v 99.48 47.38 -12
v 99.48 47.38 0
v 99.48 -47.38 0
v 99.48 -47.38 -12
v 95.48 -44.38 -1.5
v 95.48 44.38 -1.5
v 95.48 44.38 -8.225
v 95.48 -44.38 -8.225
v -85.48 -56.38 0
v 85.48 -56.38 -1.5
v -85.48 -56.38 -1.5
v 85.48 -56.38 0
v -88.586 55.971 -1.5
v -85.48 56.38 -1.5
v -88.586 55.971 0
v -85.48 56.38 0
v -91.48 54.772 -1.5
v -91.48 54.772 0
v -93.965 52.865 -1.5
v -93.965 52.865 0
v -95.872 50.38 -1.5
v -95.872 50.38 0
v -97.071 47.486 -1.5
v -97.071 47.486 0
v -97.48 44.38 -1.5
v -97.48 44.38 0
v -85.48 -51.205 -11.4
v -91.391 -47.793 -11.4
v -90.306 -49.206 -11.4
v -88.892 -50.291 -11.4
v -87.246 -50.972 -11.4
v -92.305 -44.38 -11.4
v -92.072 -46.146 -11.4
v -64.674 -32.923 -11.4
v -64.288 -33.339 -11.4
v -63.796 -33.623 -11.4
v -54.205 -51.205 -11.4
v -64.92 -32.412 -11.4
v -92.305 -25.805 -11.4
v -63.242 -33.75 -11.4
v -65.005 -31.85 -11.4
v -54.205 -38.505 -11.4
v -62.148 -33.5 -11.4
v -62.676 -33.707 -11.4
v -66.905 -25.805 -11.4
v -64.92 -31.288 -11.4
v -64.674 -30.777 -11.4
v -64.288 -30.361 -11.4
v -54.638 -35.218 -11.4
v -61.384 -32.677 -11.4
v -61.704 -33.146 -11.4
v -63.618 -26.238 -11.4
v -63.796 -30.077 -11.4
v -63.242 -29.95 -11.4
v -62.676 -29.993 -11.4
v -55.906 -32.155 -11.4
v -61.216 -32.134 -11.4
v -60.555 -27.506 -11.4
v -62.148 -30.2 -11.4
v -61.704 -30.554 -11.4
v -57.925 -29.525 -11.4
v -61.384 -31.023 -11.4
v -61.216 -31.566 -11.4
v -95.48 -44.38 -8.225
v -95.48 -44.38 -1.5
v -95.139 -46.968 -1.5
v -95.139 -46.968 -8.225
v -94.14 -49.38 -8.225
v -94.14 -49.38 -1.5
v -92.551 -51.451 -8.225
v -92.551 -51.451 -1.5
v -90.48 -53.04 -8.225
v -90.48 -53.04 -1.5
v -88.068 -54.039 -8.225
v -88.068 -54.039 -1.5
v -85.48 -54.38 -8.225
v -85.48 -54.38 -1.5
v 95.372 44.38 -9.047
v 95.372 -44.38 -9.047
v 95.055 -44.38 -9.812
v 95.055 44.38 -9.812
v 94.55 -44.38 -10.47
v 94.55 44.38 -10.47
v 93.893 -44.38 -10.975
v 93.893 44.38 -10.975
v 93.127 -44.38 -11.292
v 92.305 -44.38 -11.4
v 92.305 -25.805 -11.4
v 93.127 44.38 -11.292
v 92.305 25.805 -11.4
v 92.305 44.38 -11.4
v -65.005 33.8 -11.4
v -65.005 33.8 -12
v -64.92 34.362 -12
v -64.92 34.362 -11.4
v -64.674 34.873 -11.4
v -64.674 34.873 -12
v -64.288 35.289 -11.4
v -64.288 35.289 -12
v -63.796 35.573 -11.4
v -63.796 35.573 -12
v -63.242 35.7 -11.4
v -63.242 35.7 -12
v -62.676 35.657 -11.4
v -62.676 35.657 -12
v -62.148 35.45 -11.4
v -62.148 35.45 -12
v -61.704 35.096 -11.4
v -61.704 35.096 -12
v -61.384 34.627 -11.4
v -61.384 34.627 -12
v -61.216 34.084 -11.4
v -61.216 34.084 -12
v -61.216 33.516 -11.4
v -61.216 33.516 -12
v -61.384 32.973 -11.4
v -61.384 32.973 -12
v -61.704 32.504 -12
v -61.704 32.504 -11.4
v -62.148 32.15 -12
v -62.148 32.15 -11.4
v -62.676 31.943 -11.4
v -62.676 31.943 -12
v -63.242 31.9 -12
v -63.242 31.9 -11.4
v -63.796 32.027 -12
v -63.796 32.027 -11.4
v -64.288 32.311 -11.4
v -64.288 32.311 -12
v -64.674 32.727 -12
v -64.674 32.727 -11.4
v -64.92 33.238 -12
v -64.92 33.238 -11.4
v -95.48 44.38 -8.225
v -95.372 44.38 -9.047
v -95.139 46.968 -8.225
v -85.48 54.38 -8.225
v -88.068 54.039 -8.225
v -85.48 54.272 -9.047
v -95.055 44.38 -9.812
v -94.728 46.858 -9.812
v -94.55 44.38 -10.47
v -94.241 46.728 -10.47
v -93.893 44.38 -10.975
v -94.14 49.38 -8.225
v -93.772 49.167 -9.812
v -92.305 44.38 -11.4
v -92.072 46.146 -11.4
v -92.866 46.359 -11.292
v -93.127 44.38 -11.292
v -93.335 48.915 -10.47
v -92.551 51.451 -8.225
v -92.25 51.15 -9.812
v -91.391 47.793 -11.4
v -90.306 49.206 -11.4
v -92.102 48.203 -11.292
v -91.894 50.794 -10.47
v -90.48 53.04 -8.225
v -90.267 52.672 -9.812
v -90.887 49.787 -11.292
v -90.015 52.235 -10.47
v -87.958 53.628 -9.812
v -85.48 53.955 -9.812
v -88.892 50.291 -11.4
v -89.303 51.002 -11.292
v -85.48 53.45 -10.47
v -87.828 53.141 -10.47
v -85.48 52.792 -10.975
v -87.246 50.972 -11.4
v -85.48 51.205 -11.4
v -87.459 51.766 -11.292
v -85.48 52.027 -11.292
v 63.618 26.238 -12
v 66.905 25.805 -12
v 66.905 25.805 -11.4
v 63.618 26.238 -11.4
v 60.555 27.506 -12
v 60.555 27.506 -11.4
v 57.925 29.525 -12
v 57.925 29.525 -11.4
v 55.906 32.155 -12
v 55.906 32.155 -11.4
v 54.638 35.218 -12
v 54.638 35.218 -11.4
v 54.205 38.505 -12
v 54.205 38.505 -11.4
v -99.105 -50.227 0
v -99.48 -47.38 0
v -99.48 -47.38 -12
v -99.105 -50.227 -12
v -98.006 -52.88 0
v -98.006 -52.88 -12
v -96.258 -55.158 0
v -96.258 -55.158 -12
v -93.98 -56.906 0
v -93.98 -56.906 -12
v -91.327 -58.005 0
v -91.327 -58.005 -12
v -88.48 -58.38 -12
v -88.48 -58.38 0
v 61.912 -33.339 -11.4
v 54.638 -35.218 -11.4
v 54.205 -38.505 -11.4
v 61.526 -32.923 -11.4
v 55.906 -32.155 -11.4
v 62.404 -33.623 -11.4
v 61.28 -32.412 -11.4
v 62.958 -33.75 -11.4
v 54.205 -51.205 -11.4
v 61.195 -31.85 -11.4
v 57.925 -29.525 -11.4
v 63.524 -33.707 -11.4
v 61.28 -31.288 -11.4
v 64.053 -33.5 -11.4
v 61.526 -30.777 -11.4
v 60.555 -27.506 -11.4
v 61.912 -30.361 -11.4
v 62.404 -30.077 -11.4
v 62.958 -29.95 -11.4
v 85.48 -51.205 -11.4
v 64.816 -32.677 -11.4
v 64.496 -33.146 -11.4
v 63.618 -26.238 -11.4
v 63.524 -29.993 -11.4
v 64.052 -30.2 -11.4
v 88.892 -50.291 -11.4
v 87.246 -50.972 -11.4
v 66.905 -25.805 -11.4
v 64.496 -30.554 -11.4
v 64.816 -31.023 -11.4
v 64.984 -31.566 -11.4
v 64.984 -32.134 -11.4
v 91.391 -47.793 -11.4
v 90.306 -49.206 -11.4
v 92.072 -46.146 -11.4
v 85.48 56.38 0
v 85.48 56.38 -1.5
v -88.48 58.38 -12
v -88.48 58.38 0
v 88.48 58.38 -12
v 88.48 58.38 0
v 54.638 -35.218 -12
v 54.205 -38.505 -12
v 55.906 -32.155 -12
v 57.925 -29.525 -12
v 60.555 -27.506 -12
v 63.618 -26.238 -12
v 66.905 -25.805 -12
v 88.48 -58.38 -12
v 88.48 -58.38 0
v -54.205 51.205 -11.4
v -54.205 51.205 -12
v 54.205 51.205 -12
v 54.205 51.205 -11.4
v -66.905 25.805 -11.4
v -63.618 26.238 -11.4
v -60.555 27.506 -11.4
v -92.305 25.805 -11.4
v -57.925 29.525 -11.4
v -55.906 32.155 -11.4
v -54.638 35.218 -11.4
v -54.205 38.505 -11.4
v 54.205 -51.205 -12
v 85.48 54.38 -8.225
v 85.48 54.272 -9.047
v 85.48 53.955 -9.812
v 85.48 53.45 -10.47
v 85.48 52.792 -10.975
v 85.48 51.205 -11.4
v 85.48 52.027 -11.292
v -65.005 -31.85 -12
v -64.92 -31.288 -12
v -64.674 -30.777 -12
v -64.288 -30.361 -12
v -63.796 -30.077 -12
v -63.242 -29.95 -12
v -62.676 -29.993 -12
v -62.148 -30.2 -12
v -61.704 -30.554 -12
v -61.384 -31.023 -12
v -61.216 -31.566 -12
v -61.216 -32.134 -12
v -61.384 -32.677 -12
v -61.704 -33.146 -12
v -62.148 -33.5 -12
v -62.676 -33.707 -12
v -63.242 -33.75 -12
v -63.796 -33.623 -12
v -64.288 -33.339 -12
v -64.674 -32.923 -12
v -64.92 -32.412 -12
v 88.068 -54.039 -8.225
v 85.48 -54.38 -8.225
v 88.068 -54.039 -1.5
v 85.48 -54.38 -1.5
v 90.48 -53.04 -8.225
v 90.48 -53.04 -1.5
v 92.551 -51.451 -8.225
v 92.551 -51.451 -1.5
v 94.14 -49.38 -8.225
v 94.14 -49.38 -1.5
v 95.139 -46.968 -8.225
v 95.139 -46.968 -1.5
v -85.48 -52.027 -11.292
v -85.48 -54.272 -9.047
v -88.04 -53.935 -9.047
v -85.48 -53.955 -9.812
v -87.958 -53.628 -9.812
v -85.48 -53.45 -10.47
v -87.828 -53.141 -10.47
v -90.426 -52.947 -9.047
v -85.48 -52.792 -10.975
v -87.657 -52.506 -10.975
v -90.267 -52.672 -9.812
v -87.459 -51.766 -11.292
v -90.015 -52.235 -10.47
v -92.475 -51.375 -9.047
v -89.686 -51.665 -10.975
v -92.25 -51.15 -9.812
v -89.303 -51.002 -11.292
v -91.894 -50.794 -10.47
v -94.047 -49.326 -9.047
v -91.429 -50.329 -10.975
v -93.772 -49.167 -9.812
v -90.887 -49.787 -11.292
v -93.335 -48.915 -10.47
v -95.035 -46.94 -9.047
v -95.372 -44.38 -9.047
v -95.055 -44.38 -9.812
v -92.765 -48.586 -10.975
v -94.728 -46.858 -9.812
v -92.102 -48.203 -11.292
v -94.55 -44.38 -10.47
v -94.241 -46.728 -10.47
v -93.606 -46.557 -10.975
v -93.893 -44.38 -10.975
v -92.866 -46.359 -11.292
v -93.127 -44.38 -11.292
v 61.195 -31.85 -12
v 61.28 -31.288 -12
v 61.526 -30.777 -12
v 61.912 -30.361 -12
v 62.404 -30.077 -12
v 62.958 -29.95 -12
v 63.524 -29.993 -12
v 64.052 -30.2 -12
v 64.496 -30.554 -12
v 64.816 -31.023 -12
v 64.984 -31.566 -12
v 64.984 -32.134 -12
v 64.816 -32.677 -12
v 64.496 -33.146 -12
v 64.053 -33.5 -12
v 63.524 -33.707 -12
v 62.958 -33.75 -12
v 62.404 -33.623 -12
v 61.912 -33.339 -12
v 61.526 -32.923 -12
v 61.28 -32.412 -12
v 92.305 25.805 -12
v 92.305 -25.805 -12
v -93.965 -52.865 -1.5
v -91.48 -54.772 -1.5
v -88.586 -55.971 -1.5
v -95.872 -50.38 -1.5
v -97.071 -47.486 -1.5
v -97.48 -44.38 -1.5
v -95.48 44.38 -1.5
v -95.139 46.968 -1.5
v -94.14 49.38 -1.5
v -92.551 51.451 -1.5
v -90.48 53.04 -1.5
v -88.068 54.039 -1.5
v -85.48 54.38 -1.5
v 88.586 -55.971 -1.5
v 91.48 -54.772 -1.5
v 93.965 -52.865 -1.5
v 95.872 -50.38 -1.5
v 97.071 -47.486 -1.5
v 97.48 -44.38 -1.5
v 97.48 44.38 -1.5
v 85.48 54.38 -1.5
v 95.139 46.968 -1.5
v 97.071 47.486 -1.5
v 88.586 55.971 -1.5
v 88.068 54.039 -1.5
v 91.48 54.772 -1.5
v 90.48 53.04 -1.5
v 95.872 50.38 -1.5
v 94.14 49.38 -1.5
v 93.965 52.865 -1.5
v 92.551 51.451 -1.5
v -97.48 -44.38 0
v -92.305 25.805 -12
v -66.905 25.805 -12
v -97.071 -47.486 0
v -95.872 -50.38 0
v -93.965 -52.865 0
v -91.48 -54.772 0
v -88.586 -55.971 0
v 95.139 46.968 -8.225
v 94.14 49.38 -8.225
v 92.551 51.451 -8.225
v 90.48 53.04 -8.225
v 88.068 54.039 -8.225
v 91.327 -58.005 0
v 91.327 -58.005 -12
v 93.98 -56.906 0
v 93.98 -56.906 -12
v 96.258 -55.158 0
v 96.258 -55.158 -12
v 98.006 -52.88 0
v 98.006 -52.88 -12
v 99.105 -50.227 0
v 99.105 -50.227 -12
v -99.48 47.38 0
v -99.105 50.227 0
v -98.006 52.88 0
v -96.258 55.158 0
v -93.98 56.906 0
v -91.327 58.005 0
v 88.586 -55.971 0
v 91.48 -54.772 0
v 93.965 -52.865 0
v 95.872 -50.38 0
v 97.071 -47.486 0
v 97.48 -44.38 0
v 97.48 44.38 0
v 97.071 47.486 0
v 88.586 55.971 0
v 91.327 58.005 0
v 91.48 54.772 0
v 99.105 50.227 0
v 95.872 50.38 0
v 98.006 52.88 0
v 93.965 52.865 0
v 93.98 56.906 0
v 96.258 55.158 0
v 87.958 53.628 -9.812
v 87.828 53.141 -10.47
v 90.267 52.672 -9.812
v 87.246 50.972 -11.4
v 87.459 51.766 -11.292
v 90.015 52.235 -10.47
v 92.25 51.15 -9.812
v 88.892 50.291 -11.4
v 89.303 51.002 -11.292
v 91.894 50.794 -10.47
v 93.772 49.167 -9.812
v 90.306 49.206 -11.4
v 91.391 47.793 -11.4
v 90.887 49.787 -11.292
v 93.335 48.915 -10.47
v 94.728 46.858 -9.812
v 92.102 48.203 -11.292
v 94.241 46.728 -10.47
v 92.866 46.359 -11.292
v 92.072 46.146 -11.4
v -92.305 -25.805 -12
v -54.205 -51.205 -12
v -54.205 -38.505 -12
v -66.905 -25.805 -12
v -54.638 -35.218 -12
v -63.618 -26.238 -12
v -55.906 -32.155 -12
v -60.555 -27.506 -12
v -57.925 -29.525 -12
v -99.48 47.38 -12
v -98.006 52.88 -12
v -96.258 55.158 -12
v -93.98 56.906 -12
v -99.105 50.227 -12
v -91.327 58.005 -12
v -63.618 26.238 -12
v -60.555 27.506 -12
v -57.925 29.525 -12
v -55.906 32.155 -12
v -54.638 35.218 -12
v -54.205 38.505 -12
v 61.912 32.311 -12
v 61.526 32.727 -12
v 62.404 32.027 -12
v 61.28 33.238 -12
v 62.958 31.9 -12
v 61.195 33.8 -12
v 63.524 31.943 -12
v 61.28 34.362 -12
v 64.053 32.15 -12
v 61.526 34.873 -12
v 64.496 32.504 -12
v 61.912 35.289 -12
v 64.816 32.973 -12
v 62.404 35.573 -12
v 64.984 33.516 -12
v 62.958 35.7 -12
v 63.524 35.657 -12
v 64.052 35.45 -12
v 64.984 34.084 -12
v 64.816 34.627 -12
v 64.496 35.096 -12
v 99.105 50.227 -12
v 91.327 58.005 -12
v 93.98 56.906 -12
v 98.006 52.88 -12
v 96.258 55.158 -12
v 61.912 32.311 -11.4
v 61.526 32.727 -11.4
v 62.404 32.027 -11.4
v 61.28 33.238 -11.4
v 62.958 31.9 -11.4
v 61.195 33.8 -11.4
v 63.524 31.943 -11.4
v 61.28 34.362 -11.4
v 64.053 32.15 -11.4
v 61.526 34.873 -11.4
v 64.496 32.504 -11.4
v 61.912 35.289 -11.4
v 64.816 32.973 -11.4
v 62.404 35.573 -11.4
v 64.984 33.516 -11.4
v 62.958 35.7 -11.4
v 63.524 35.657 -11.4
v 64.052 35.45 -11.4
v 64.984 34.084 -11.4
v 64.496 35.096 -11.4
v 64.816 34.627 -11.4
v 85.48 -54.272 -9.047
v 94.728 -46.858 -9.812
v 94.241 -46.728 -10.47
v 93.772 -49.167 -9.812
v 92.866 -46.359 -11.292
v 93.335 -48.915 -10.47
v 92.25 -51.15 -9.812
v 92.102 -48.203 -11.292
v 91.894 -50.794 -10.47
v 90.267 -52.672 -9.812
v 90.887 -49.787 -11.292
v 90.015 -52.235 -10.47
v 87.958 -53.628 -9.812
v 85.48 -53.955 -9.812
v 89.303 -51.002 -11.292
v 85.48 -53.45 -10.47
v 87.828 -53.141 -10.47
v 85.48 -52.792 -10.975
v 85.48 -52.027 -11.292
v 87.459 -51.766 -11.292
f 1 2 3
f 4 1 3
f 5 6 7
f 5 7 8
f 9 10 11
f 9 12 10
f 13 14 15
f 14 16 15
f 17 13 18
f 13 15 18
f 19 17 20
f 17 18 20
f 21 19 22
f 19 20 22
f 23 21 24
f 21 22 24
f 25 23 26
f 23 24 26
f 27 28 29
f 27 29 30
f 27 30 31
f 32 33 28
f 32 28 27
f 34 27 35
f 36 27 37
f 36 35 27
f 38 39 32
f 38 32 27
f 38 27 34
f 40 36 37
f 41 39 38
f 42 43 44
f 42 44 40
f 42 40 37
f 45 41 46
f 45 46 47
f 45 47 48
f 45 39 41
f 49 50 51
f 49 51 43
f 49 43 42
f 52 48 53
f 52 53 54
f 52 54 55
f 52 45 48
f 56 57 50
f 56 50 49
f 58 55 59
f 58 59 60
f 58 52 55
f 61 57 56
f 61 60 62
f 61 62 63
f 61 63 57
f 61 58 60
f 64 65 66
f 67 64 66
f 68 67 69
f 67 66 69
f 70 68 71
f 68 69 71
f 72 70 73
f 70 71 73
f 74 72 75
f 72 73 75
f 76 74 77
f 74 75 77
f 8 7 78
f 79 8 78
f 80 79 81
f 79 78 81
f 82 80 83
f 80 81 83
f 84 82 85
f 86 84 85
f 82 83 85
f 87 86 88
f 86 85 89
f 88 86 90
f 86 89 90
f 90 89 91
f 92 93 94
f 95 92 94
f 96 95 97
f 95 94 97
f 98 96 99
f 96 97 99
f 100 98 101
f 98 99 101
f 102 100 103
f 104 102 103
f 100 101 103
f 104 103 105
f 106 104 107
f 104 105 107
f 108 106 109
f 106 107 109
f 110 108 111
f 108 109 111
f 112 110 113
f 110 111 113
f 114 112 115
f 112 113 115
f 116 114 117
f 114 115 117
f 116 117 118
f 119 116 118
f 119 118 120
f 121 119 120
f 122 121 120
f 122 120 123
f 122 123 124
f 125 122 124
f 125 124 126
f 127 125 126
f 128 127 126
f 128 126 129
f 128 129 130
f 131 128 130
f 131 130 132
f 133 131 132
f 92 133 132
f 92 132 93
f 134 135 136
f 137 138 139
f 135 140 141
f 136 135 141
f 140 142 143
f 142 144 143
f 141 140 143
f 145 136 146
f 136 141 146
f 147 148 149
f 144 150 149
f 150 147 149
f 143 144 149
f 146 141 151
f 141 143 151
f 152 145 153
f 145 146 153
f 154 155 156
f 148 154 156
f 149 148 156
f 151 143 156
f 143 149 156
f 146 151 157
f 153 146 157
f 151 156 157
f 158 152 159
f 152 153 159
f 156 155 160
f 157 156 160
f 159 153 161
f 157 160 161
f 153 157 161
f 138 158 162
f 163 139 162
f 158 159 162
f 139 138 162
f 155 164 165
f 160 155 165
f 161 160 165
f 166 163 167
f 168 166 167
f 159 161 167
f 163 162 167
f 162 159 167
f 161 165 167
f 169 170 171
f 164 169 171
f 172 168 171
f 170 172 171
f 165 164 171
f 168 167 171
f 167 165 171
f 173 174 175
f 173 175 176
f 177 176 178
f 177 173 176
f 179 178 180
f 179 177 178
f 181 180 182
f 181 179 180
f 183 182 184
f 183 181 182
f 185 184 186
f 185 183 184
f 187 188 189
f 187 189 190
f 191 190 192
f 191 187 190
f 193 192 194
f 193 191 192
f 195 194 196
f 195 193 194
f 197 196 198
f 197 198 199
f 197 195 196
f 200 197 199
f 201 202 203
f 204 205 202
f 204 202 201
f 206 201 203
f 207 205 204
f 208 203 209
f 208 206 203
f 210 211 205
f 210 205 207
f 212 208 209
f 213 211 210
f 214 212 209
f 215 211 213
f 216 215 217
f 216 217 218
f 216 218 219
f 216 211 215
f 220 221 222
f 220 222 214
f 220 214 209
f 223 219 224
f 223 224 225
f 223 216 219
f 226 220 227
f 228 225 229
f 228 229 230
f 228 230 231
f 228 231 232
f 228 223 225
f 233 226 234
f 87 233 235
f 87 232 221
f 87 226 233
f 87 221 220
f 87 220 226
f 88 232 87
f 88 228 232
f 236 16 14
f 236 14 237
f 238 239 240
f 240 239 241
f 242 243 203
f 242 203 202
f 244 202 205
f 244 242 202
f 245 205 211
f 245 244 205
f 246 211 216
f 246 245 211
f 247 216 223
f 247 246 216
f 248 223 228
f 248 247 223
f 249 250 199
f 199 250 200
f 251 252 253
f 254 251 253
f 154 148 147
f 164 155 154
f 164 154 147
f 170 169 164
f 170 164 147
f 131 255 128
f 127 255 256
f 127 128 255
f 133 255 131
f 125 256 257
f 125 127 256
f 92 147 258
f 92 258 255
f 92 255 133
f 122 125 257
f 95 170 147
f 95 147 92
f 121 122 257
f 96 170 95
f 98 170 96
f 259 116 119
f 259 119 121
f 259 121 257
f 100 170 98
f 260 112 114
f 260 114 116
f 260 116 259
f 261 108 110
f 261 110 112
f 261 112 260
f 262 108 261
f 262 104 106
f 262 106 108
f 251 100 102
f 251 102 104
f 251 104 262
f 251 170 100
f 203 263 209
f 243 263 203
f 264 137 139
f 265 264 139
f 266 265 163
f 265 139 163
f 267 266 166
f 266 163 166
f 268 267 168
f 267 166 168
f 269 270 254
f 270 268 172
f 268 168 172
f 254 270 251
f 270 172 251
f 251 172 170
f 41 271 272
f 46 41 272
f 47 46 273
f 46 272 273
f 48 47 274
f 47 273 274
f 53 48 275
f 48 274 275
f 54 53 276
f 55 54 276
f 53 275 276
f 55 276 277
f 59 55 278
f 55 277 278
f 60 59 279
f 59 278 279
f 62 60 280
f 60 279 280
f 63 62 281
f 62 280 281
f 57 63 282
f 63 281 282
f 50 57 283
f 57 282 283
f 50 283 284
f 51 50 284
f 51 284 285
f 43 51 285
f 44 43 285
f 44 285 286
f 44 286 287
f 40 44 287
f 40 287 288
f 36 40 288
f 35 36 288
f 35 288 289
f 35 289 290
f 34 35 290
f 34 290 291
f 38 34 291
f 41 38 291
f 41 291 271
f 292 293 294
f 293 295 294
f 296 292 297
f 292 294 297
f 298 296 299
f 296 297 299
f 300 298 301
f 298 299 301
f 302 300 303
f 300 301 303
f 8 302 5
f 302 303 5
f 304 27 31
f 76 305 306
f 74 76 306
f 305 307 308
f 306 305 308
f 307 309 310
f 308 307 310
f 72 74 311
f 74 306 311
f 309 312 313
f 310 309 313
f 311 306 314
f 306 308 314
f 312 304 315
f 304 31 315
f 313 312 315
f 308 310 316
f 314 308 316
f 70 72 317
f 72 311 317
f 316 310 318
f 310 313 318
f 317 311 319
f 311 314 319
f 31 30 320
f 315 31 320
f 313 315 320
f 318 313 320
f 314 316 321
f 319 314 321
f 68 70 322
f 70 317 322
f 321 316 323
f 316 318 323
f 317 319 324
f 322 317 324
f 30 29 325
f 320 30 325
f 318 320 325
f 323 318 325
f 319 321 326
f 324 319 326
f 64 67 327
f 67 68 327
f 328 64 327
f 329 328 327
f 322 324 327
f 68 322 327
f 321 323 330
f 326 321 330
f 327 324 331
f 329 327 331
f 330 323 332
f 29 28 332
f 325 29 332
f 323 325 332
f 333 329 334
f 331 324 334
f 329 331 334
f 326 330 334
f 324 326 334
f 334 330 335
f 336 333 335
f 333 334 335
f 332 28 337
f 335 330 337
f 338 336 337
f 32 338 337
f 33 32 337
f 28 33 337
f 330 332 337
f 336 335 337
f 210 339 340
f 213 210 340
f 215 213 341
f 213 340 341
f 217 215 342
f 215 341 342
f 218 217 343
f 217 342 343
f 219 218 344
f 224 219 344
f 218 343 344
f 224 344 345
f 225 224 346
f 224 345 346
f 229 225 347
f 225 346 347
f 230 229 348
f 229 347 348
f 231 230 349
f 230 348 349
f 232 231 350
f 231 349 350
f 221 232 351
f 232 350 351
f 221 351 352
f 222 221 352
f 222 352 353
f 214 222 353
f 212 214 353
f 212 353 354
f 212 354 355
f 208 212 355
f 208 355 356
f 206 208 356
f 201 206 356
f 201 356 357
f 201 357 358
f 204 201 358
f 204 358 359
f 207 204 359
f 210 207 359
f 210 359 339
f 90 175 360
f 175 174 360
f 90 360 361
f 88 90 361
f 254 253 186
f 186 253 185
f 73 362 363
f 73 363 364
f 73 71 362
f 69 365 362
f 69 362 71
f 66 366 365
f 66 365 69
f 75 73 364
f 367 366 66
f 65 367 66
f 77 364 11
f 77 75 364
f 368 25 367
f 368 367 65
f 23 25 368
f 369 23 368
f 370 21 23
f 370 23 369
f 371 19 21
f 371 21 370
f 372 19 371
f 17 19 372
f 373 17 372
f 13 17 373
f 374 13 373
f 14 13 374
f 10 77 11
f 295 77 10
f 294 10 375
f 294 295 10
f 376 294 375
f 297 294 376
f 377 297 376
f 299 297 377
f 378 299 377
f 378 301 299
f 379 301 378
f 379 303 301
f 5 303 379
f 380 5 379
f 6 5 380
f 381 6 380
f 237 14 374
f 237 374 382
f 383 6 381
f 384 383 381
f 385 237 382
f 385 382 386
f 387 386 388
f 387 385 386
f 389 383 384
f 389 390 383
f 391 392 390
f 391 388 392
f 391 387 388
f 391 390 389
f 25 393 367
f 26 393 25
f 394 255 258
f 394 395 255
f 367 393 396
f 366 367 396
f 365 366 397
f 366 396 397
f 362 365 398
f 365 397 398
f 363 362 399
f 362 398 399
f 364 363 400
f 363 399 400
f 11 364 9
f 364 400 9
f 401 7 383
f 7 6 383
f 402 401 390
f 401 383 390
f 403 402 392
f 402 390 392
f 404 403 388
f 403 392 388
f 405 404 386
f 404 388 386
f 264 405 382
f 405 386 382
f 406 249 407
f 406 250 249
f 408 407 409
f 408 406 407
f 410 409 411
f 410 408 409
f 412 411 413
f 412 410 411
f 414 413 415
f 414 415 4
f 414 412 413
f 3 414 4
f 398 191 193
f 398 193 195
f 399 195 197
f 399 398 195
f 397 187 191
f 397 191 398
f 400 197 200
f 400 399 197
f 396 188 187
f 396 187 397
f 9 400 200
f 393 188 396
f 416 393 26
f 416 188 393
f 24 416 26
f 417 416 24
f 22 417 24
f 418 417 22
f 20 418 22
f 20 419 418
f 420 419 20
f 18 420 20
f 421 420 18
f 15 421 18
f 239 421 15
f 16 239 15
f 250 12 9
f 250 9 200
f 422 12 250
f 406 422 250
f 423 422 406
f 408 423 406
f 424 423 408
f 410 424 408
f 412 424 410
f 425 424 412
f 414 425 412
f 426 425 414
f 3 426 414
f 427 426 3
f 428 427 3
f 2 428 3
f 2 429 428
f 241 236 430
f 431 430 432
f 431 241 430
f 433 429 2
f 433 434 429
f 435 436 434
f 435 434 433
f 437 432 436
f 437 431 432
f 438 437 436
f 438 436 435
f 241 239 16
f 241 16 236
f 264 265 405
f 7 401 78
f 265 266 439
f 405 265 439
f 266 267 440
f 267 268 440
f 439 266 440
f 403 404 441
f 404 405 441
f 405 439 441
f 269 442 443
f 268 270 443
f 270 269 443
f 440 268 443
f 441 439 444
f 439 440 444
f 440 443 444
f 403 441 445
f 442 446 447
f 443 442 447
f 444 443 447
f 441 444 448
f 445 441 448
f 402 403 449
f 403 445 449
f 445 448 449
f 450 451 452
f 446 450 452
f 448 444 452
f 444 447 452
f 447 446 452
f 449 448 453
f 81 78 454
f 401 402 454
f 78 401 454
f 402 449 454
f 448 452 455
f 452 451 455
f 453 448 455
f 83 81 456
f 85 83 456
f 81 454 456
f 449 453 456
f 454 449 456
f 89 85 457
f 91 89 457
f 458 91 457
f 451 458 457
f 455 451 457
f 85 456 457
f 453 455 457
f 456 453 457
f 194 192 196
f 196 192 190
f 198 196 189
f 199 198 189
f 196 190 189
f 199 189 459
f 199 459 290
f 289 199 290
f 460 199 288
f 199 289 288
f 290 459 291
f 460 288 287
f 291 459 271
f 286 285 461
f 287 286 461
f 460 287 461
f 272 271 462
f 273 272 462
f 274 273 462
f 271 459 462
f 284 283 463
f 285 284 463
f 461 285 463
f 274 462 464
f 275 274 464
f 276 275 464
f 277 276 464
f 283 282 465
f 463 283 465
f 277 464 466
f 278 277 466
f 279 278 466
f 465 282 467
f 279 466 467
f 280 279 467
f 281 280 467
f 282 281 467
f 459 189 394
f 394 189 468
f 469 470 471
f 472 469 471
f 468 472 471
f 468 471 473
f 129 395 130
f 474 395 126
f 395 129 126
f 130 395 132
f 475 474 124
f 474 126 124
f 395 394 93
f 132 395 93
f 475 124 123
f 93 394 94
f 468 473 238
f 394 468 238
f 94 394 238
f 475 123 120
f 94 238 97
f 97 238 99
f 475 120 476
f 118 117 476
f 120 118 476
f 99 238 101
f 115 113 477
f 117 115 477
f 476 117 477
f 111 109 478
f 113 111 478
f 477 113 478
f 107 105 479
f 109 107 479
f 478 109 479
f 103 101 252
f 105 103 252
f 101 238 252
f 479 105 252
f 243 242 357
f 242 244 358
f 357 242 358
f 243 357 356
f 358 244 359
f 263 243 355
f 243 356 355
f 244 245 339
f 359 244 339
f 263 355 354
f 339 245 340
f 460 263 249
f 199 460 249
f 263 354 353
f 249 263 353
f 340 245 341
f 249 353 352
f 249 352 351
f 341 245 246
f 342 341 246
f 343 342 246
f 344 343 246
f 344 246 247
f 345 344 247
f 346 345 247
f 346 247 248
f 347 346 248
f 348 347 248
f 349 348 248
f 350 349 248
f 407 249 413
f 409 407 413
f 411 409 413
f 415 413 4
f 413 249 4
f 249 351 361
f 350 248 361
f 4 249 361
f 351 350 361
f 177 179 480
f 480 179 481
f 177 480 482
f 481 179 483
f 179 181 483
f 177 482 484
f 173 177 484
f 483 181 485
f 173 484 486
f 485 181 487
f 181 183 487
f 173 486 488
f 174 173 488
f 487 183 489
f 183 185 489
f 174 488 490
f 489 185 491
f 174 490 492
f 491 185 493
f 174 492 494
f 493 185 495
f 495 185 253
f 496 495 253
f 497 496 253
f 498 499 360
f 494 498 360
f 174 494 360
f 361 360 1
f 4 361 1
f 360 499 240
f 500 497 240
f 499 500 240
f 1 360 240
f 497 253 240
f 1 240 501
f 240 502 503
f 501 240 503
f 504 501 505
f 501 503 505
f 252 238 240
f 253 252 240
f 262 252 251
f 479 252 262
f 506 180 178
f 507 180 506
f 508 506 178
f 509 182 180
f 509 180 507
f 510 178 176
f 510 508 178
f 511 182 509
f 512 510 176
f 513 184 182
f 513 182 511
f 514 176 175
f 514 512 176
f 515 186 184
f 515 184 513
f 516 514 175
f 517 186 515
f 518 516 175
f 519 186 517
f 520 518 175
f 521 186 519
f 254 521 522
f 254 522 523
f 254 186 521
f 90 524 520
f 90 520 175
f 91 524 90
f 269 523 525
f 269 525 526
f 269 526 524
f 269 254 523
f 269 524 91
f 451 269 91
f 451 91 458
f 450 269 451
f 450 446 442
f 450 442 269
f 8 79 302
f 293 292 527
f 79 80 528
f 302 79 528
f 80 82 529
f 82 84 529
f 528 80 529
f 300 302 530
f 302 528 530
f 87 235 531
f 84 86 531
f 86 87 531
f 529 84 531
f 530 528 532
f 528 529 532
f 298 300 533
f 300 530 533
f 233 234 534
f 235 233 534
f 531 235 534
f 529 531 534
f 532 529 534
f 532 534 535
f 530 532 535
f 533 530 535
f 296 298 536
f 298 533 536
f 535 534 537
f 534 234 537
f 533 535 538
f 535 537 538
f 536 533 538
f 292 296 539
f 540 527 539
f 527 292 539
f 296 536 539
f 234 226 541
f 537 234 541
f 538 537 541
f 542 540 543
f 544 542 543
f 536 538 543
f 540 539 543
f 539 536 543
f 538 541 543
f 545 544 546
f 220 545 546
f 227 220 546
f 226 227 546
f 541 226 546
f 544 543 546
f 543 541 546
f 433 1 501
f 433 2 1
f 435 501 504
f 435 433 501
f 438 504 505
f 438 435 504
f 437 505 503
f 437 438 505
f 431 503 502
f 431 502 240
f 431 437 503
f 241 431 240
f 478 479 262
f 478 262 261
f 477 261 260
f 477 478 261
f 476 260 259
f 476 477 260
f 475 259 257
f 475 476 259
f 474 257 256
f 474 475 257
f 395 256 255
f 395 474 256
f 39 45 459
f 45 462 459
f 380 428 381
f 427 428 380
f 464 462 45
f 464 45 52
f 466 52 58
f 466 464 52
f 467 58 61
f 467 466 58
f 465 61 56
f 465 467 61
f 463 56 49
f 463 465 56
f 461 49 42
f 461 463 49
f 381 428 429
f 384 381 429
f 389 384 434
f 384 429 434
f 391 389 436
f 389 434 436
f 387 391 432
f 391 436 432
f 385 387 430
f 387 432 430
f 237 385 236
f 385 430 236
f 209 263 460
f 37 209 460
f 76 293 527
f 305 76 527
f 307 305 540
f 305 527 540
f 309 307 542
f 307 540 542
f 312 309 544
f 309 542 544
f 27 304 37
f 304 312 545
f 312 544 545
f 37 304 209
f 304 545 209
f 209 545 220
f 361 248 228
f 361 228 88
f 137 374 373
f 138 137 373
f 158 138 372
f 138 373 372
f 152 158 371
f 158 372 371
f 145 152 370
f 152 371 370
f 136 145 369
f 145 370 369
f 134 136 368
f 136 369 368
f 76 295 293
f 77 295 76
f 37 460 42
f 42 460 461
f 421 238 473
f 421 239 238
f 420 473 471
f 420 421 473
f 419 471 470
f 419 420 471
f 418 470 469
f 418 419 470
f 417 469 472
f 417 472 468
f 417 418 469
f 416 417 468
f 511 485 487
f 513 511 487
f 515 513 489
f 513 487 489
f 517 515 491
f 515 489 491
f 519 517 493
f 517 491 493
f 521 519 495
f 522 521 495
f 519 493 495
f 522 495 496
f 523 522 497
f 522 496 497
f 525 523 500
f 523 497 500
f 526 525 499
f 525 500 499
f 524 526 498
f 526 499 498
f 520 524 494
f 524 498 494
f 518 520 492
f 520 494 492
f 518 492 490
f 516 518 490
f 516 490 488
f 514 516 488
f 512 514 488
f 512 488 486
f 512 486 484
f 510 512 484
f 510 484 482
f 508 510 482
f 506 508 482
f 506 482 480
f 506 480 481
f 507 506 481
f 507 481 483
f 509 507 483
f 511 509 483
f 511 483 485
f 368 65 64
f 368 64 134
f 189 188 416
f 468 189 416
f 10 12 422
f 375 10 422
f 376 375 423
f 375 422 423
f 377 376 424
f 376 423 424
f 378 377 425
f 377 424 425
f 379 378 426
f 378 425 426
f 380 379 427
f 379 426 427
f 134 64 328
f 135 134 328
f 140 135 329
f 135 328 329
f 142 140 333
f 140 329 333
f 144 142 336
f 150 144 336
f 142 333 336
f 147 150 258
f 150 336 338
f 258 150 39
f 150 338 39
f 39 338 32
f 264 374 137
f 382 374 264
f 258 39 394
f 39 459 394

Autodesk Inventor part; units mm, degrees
ref_plane "YZ Plane" through (0, 0, 0) normal (1, 0, 0) x (0, 1, 0)
ref_plane "XZ Plane" through (0, 0, 0) normal (0, 1, 0) x (-1, 0, 0)
ref_plane "XY Plane" through (0, 0, 0) normal (0, 0, 1) x (1, 0, 0)
sketch "Sketch1" plane through (0, 0, 0) normal (0, 0, 1) x (1, 0, 0)
  line L0 (77.5, 43.5) -> (77.5, -43.5) projected
  line L1 (77.5, -43.5) -> (-77.5, -43.5) projected
  line L2 (-77.5, -43.5) -> (-77.5, 43.5) projected
  line L3 (-77.5, 43.5) -> (77.5, 43.5) projected
  line L4 (85.48, 55.38) -> (-85.48, 55.38) projected
  arc A0 (-85.48, 55.38) -> (-96.48, 44.38) centre (-85.48, 44.38) ccw projected
  line L5 (-96.48, 44.38) -> (-96.48, -44.38) projected
  arc A1 (-96.48, -44.38) -> (-85.48, -55.38) centre (-85.48, -44.38) ccw projected
  line L6 (-85.48, -55.38) -> (85.48, -55.38) projected
  arc A2 (85.48, -55.38) -> (96.48, -44.38) centre (85.48, -44.38) ccw projected
  line L7 (96.48, -44.38) -> (96.48, 44.38) projected
  arc A3 (96.48, 44.38) -> (85.48, 55.38) centre (85.48, 44.38) ccw projected
  line L8 (-88.48, 58.38) -> (88.48, 58.38)
  line L9 (99.48, 47.38) -> (99.48, -47.38)
  line L10 (88.48, -58.38) -> (-88.48, -58.38)
  line L11 (-99.48, -47.38) -> (-99.48, 47.38)
  arc A4 (-88.48, 58.38) -> (-99.48, 47.38) centre (-88.48, 47.38) ccw
  arc A5 (99.48, 47.38) -> (88.48, 58.38) centre (88.48, 47.38) ccw
  arc A6 (88.48, -58.38) -> (99.48, -47.38) centre (88.48, -47.38) ccw
  arc A7 (-99.48, -47.38) -> (-88.48, -58.38) centre (-88.48, -47.38) ccw
  point P0 (0, 0)
  dimension "d0" = 3
  dimension "d1" = 3
  dimension "d2" = 3
  dimension "d3" = 3
  dimension "d4" = 11
  dimension "d5" = 11
extrude "Extrusion1" add sketch "Sketch1" against normal blind 12 contours L0 L1 L2 L3 | A3 L7 A2 L6 A1 L5 A0 L4 | L8 A5 L9 A6 L10 A7 L11 A4
sketch "Sketch2" plane through (0, 0, 0) normal (0, 0, 1) x (1, 0, 0)
  line L0 (-88.48, 58.38) -> (88.48, 58.38) projected
  arc A0 (-88.48, 58.38) -> (-99.48, 47.38) centre (-88.48, 47.38) ccw projected
  line L1 (-99.48, -47.38) -> (-99.48, 47.38) projected
  arc A1 (-99.48, -47.38) -> (-88.48, -58.38) centre (-88.48, -47.38) ccw projected
  line L2 (88.48, -58.38) -> (-88.48, -58.38) projected
  arc A2 (88.48, -58.38) -> (99.48, -47.38) centre (88.48, -47.38) ccw projected
  line L3 (99.48, 47.38) -> (99.48, -47.38) projected
  arc A3 (99.48, 47.38) -> (88.48, 58.38) centre (88.48, 47.38) ccw projected
  line L4 (77.5, 43.5) -> (77.5, -43.5) projected
  line L5 (77.5, -43.5) -> (-77.5, -43.5) projected
  line L6 (-77.5, -43.5) -> (-77.5, 43.5) projected
  line L7 (-77.5, 43.5) -> (77.5, 43.5) projected
  line L8 (85.48, 55.38) -> (-85.48, 55.38) projected
  arc A4 (-85.48, 55.38) -> (-96.48, 44.38) centre (-85.48, 44.38) ccw projected
  line L9 (-96.48, 44.38) -> (-96.48, -44.38) projected
  arc A5 (-96.48, -44.38) -> (-85.48, -55.38) centre (-85.48, -44.38) ccw projected
  line L10 (-85.48, -55.38) -> (85.48, -55.38) projected
  arc A6 (85.48, -55.38) -> (96.48, -44.38) centre (85.48, -44.38) ccw projected
  line L11 (96.48, -44.38) -> (96.48, 44.38) projected
  arc A7 (96.48, 44.38) -> (85.48, 55.38) centre (85.48, 44.38) ccw projected
  arc A8 (-85.48, 56.38) -> (-97.48, 44.38) centre (-85.48, 44.38) ccw
  line L12 (-85.48, 56.38) -> (85.48, 56.38)
  arc A9 (97.48, 44.38) -> (85.48, 56.38) centre (85.48, 44.38) ccw
  line L13 (97.48, 44.38) -> (97.48, -44.38)
  arc A10 (85.48, -56.38) -> (97.48, -44.38) centre (85.48, -44.38) ccw
  line L14 (85.48, -56.38) -> (-85.48, -56.38)
  arc A11 (-97.48, -44.38) -> (-85.48, -56.38) centre (-85.48, -44.38) ccw
  line L15 (-97.48, -44.38) -> (-97.48, 44.38)
  point P0 (0, 0)
  dimension "d8" = 1
extrude "Extrusion2" cut sketch "Sketch2" against normal blind 1.5 contours L4 L5 L6 L7 | A7 L11 A6 L10 A5 L9 A4 L8 | L12 A9 L13 A10 L14 A11 L15 A8
sketch "Sketch3" plane through (0, 0, -1.5) normal (0, 0, 1) x (1, 0, 0)
  arc A0 (-85.48, 56.38) -> (-97.48, 44.38) centre (-85.48, 44.38) ccw projected
  line L0 (-97.48, -44.38) -> (-97.48, 44.38) projected
  arc A1 (-97.48, -44.38) -> (-85.48, -56.38) centre (-85.48, -44.38) ccw projected
  line L1 (85.48, -56.38) -> (-85.48, -56.38) projected
  arc A2 (85.48, -56.38) -> (97.48, -44.38) centre (85.48, -44.38) ccw projected
  line L2 (97.48, 44.38) -> (97.48, -44.38) projected
  arc A3 (97.48, 44.38) -> (85.48, 56.38) centre (85.48, 44.38) ccw projected
  line L3 (-85.48, 56.38) -> (85.48, 56.38) projected
  arc A4 (-85.48, 54.38) -> (-95.48, 44.38) centre (-85.48, 44.38) ccw
  line L4 (-85.48, 54.38) -> (85.48, 54.38)
  arc A5 (95.48, 44.38) -> (85.48, 54.38) centre (85.48, 44.38) ccw
  line L5 (95.48, 44.38) -> (95.48, -44.38)
  arc A6 (85.48, -54.38) -> (95.48, -44.38) centre (85.48, -44.38) ccw
  line L6 (85.48, -54.38) -> (-85.48, -54.38)
  arc A7 (-95.48, -44.38) -> (-85.48, -54.38) centre (-85.48, -44.38) ccw
  line L7 (-95.48, -44.38) -> (-95.48, 44.38)
  point P0 (0, 0)
  dimension "d11" = 2
extrude "Extrusion3" cut sketch "Sketch3" against normal blind 9.9 contours L4 A5 L5 A6 L6 A7 L7 A4
fillet "Fillet1" radius 3.175 8 edges at (92.5511, 51.4511, -11.4) (95.48, 0, -11.4) (92.5511, -51.4511, -11.4) (0, -54.38, -11.4) (-92.5511, -51.4511, -11.4) (-95.48, 0, -11.4) (-92.5511, 51.4511, -11.4) (0, 54.38, -11.4)
sketch "Sketch5" plane through (0, 0, -12) normal (0, 0, -1) x (-1, 0, 0)
  arc A0 (-85.48, 51.205) -> (-92.305, 44.38) centre (-85.48, 44.38) ccw projected
  line L0 (85.48, 51.205) -> (-85.48, 51.205) projected
  arc A1 (92.305, 44.38) -> (85.48, 51.205) centre (85.48, 44.38) ccw projected
  line L1 (92.305, -44.38) -> (92.305, 44.38) projected
  arc A2 (85.48, -51.205) -> (92.305, -44.38) centre (85.48, -44.38) ccw projected
  line L2 (-85.48, -51.205) -> (85.48, -51.205) projected
  arc A3 (-92.305, -44.38) -> (-85.48, -51.205) centre (-85.48, -44.38) ccw projected
  line L3 (-92.305, 44.38) -> (-92.305, -44.38) projected
  circle A4 centre (-63.1, 33.8) radius 1.5 projected
  circle A5 centre (-63.1, -31.85) radius 1.5 projected
  circle A6 centre (63.1, -31.85) radius 1.5 projected
  circle A7 centre (63.1, 33.8) radius 1.5 projected
  circle A8 centre (-63.1, 33.8) radius 1.905
  circle A9 centre (63.1, 33.8) radius 1.905
  circle A10 centre (63.1, -31.85) radius 1.905
  circle A11 centre (-63.1, -31.85) radius 1.905
  line L4 (-54.205, 51.205) -> (-54.205, 38.505)
  line L5 (-66.905, 25.805) -> (-92.305, 25.805)
  arc A12 (-66.905, 25.805) -> (-54.205, 38.505) centre (-66.905, 38.505) ccw
  line L6 (0, 51.205) -> (0, -51.205)
  line L7 (-92.305, 0) -> (92.305, 0)
  line L8 (54.205, 51.205) -> (54.205, 38.505)
  line L9 (66.905, 25.805) -> (92.305, 25.805)
  arc A13 (54.205, 38.505) -> (66.905, 25.805) centre (66.905, 38.505) ccw
  line L10 (-54.205, -51.205) -> (-54.205, -38.505)
  line L11 (-66.905, -25.805) -> (-92.305, -25.805)
  arc A14 (-54.205, -38.505) -> (-66.905, -25.805) centre (-66.905, -38.505) ccw
  line L12 (54.205, -51.205) -> (54.205, -38.505)
  arc A15 (66.905, -25.805) -> (54.205, -38.505) centre (66.905, -38.505) ccw
  line L13 (66.905, -25.805) -> (92.305, -25.805)
  line L14 (-54.205, 51.205) -> (54.205, 51.205)
  line L15 (92.305, 25.805) -> (92.305, -25.805)
  line L16 (54.205, -51.205) -> (-54.205, -51.205)
  line L17 (-92.305, -25.805) -> (-92.305, 25.805)
  point P0 (0, 0)
  dimension "d38" = 3.81
  dimension "d39" = 3.81
  dimension "d40" = 3.81
  dimension "d41" = 3.81
  dimension "d51" = 12.7
  dimension "d52" = 25.4
  dimension "d53" = 38.1
extrude "Extrusion4" cut sketch "Sketch5" against normal through all contours L0 L6 L7 L3 L5 A12 L4 | L0 L8 A13 L9 L1 L7 L6 | L7 L6 L2 L10 A14 L11 L3 | L7 L1 L13 A15 L12 L2 L6 | A4 | A5 | A6 | A7 | A8 | A9 | A10 | A11
equation "\"d1\" = d0"
equation "\"d2\" = d0"
equation "\"d3\" = d0"
equation "\"d4\" = d5"
equation "\"d39\" = d38"
equation "\"d40\" = d38"
equation "\"d41\" = d38"
properties part number "Hub Enclosure Front"
